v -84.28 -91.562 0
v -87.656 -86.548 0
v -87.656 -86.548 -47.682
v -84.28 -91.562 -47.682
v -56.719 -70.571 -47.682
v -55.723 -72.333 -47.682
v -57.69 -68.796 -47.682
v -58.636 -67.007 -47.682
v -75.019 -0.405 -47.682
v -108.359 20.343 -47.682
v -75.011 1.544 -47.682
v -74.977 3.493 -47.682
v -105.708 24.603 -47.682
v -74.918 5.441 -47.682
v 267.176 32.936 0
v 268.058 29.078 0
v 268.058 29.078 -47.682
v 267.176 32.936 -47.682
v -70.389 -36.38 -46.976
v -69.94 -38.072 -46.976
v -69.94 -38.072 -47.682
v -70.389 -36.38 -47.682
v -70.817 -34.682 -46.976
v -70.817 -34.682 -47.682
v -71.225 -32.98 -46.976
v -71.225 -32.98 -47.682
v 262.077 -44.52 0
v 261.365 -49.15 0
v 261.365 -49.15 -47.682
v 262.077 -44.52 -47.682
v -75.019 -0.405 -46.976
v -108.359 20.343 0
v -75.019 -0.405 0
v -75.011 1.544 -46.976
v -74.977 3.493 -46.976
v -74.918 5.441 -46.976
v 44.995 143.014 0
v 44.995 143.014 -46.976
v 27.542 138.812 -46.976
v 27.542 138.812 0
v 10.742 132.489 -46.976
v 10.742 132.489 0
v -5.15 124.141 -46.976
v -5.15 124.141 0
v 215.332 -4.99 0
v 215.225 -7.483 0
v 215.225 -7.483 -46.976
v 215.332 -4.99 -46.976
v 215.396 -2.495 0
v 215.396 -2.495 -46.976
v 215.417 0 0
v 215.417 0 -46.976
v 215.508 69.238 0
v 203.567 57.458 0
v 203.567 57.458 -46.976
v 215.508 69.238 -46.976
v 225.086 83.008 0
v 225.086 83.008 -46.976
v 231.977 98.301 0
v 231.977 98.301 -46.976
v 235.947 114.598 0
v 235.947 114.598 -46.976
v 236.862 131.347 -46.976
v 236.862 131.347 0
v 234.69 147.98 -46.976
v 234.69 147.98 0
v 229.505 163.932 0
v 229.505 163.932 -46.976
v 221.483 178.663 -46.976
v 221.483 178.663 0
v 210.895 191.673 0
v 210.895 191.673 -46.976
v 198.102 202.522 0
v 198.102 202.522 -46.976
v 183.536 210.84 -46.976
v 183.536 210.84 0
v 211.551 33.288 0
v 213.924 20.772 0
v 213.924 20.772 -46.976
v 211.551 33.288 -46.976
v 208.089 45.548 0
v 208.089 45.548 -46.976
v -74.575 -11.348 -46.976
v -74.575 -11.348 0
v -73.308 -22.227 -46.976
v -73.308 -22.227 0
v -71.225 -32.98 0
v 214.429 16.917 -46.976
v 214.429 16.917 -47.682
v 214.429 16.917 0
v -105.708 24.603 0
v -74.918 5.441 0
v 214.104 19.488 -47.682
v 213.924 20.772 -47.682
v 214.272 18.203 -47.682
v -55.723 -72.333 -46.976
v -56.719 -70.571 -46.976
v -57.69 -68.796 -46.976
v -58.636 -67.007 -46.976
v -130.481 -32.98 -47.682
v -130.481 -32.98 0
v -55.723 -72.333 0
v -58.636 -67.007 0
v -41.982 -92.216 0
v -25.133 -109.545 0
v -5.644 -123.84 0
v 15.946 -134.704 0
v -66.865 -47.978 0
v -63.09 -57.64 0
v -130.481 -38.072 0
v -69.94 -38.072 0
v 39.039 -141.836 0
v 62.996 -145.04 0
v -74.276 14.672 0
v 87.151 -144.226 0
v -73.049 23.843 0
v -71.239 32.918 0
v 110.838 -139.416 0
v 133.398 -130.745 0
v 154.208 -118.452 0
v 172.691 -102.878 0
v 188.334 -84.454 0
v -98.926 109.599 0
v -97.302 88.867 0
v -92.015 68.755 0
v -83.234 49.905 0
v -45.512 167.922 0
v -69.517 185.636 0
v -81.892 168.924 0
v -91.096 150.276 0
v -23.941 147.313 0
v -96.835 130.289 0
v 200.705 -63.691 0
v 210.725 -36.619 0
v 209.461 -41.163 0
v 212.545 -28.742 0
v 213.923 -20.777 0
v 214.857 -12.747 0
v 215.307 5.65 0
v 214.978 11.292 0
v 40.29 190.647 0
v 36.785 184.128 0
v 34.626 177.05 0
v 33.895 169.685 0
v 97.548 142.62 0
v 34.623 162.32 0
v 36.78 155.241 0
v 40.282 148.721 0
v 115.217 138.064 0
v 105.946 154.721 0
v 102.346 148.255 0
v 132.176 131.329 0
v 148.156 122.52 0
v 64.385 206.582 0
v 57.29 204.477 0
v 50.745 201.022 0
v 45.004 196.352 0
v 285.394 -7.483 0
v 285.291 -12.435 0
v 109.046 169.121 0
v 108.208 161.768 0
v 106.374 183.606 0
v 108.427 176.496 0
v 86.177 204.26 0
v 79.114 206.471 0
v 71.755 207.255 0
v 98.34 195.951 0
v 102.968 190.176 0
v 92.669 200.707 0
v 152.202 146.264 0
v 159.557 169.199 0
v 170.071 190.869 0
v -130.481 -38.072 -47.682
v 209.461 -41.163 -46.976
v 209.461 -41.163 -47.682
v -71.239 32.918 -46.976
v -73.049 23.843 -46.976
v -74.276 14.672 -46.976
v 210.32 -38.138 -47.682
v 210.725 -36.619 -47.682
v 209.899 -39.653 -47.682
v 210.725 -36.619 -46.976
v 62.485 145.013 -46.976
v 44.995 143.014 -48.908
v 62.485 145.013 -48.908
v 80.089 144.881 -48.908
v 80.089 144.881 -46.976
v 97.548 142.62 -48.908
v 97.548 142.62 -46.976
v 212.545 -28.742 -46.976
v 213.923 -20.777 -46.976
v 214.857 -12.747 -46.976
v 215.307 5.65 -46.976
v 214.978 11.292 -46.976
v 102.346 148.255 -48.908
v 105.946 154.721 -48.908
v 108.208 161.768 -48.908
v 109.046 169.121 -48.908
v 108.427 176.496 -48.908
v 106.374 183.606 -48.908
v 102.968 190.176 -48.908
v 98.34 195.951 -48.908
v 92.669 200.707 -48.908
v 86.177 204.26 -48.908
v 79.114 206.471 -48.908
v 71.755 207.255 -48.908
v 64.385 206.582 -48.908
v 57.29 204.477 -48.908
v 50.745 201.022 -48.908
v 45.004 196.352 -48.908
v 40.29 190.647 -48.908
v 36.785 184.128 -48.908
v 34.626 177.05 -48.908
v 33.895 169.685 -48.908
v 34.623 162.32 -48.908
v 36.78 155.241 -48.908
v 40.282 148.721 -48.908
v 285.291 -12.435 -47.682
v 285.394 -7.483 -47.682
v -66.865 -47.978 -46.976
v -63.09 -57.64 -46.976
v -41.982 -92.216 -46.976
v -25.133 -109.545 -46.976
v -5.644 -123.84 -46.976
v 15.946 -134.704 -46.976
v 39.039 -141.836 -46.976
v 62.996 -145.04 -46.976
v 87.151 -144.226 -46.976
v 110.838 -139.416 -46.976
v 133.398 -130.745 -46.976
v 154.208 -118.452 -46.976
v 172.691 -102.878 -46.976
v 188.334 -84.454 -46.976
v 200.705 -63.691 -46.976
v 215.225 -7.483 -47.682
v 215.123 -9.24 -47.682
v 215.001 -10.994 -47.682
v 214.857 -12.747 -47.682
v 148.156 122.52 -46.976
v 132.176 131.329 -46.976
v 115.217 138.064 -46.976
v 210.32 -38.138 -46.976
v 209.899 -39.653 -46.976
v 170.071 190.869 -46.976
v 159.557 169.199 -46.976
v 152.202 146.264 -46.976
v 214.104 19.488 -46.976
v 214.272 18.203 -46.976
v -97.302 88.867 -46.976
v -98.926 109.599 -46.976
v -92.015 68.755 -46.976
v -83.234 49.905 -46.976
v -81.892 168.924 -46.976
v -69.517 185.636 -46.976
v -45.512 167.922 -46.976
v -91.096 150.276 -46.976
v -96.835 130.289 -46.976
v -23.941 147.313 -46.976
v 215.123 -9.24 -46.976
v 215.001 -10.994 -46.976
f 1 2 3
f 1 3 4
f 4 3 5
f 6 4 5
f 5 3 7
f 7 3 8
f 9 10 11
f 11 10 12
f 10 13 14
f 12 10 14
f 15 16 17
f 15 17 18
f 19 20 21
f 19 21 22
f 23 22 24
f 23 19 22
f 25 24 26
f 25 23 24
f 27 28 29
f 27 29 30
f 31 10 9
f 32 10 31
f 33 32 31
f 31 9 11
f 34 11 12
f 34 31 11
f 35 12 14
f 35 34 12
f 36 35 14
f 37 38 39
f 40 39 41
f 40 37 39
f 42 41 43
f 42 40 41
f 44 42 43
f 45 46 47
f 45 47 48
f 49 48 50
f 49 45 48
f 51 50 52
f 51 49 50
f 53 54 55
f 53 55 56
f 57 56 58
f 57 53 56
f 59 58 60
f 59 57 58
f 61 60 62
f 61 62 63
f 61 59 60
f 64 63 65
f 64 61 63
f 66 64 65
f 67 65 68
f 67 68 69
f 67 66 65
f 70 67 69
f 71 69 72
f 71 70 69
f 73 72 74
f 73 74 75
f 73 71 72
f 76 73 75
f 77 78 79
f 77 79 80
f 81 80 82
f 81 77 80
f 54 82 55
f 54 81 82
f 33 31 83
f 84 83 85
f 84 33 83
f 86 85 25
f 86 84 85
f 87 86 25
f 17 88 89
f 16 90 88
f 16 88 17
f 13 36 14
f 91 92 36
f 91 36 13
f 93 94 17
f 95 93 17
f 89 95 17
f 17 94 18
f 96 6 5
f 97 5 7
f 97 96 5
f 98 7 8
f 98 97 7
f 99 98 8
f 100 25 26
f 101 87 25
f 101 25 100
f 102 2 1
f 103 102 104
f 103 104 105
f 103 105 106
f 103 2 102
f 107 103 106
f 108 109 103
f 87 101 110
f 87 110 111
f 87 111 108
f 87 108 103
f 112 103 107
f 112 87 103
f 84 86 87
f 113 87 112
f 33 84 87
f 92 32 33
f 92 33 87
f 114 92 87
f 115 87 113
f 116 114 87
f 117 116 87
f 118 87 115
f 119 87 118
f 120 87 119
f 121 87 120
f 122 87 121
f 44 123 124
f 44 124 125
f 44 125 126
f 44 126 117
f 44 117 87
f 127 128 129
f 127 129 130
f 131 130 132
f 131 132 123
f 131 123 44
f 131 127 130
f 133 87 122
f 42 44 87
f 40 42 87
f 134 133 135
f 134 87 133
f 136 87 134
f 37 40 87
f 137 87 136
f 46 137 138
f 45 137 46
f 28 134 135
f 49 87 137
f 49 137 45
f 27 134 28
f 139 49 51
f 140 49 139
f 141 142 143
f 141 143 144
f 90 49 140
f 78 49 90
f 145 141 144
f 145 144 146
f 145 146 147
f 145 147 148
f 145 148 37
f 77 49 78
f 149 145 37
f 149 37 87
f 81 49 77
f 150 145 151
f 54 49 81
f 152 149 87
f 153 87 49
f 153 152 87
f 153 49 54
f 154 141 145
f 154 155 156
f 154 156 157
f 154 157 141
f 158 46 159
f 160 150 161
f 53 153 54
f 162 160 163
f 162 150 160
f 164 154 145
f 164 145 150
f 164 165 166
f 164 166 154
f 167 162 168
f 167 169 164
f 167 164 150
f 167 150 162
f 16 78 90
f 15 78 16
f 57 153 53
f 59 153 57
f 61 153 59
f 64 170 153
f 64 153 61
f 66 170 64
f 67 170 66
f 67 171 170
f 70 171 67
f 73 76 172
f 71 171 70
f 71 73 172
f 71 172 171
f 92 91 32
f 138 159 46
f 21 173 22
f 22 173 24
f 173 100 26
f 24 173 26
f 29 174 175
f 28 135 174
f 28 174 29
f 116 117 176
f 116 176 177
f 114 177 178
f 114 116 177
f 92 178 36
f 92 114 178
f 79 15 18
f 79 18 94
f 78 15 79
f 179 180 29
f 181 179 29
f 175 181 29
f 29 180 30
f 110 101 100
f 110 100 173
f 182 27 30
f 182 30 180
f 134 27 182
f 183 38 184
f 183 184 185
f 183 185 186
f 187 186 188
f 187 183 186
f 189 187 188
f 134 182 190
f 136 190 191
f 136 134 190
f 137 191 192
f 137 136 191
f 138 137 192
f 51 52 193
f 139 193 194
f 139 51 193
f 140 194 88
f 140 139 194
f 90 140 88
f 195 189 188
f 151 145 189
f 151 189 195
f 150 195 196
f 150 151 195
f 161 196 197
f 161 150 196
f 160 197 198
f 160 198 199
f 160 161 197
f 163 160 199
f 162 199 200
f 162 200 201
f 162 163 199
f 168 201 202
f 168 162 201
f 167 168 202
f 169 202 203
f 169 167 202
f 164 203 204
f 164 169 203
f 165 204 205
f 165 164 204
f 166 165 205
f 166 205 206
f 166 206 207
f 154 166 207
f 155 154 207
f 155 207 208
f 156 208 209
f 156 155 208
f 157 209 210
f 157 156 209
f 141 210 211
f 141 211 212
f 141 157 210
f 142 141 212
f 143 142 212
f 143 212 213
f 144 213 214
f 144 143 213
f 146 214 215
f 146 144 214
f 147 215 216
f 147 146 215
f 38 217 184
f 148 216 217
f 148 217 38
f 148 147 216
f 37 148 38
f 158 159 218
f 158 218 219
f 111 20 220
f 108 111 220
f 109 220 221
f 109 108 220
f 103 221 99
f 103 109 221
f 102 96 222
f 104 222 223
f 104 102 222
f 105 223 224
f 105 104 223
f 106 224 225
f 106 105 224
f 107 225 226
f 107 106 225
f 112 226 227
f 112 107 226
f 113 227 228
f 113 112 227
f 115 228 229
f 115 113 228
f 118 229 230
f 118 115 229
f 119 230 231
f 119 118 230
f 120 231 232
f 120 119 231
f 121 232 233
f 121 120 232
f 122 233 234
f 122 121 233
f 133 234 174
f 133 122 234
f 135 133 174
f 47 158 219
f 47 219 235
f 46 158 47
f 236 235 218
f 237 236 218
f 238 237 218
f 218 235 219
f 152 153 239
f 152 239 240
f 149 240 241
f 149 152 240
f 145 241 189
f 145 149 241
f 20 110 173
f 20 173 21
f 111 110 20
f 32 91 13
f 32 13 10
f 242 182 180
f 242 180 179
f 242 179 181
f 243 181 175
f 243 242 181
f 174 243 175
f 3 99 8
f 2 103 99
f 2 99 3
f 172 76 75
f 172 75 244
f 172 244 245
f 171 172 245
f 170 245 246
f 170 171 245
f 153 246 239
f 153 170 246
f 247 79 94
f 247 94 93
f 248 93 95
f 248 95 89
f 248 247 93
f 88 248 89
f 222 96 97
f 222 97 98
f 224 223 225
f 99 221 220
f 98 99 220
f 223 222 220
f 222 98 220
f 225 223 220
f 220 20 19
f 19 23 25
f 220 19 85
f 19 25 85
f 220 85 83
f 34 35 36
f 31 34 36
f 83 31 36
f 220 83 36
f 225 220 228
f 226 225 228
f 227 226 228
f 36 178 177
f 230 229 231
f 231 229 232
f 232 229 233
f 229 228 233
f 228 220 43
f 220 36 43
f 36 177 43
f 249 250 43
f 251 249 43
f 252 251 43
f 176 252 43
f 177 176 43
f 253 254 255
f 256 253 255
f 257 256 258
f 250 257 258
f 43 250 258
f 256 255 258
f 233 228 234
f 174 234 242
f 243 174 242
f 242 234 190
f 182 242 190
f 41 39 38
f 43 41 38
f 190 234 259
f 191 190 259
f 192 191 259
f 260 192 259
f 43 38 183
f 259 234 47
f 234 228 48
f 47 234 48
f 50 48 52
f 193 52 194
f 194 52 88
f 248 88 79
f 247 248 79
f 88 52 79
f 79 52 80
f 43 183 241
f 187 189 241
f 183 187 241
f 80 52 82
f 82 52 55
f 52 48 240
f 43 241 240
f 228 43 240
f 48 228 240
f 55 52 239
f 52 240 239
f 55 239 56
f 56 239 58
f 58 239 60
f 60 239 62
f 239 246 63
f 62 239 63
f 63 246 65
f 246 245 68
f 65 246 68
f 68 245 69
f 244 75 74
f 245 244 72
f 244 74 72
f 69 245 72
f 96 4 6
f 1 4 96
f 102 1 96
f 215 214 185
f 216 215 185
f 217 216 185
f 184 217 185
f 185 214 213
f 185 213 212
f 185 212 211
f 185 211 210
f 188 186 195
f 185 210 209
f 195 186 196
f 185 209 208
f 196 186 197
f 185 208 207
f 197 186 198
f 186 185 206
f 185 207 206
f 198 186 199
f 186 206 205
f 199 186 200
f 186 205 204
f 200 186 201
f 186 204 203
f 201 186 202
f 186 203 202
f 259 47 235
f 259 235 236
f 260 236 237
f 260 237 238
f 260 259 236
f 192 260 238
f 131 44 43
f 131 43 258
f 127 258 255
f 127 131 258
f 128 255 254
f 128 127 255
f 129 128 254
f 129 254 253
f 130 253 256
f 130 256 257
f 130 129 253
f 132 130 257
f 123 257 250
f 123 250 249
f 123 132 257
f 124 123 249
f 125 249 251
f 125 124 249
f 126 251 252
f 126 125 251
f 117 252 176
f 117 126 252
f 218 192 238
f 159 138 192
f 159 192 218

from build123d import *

# Parameters (mm, degrees)
F1_DEPTH = 46.9760447741
F3_DEPTH = 48.9080855623
F6_DEPTH = 47.6816631854


with BuildPart() as f1:
    # F0 (on Top) → F1 (new body)
    with BuildSketch(Plane.XY):
        with BuildLine():
            ThreePointArc((-71.2393962349, 32.9179256613), (53.631854808, -144.2703545516), (215.4174560814, 0))
            ThreePointArc((215.4174560814, 0), (212.4239330052, 29.333743716), (203.5667803118, 57.4581200997))
            ThreePointArc((203.5667803118, 57.4581200997), (180.7556781079, 94.1574324953), (148.1557889137, 122.5199630346))
            ThreePointArc((148.1557889137, 122.5199630346), (71.7340942101, 145.2103590343), (-5.1502163644, 124.140658527))
            ThreePointArc((-5.1502163644, 124.140658527), (-47.4003805504, 85.1985600864), (-71.2393962349, 32.9179256613))
        make_face()
        with BuildLine():
            ThreePointArc((148.1557889137, 122.5199630346), (180.7556781079, 94.1574324953), (203.5667803118, 57.4581200997))
            ThreePointArc((203.5667803118, 57.4581200997), (236.1595707678, 139.7134864477), (183.5359483957, 210.840061307))
            ThreePointArc((183.5359483957, 210.840061307), (159.5565215905, 169.199462517), (148.1557889137, 122.5199630346))
        make_face()
        with BuildLine():
            ThreePointArc((-69.5170983672, 185.6363117695), (-98.925732723, 109.5990660233), (-71.2393962349, 32.9179256613))
            ThreePointArc((-71.2393962349, 32.9179256613), (-47.4003805504, 85.1985600864), (-5.1502163644, 124.140658527))
            ThreePointArc((-5.1502163644, 124.140658527), (-34.3996197413, 157.9595128325), (-69.5170983672, 185.6363117695))
        make_face()
    extrude(amount=-F1_DEPTH)

    # F2 (on face) → F3 (join)
    with BuildSketch(Plane.XY):
        with BuildLine():
            ThreePointArc((44.9946392241, 143.0144957499), (71.2893502257, 145.2143795795), (97.5480618405, 142.6198892915))
            ThreePointArc((97.5480618405, 142.6198892915), (71.7551928662, 207.2549889957), (44.9946392241, 143.0144957499))
        make_face()
    extrude(amount=-F3_DEPTH)

    # F5 (on face) → F6 (join)
    with BuildSketch(Plane.XY):
        with BuildLine():
            ThreePointArc((-75.0189256599, -0.404913858), (-74.9976500667, 2.5184711417), (-74.917529707, 5.4408354645))
            Line((-74.917529707, 5.4408354645), (-105.7080030441, 24.6027484536))
            Line((-105.7080030441, 24.6027484536), (-108.3586743244, 20.3434960801))
            Line((-108.3586743244, 20.3434960801), (-75.0189256599, -0.404913858))
        make_face()
        with BuildLine():
            ThreePointArc((-69.9400027769, -38.0719006061), (-70.6055307061, -35.5315897531), (-71.2250142357, -32.9796597362))
            Line((-71.2250142357, -32.9796597362), (-130.4813623428, -32.9796597362))
            Line((-130.4813623428, -32.9796597362), (-130.4813623428, -38.0719006062))
            Line((-130.4813623428, -38.0719006062), (-69.9400027769, -38.0719006062))
        make_face()
        with BuildLine():
            ThreePointArc((-55.7230830607, -72.3328295314), (-57.207340031, -69.6852480865), (-58.6359381198, -67.0072238594))
            Line((-58.6359381198, -67.0072238594), (-87.6557826996, -86.5481868386))
            Line((-87.6557826996, -86.5481868386), (-84.2797279511, -91.561889807))
            Line((-84.2797279511, -91.561889807), (-55.7230830607, -72.3328295314))
        make_face()
        with BuildLine():
            ThreePointArc((215.2245101702, -7.483407855), (215.0646070932, -10.1171082931), (214.8568793088, -12.747468755))
            Line((214.8568793088, -12.747468755), (285.2909564972, -12.4354660511))
            Line((285.2909564972, -12.4354660511), (285.3941321373, -7.483407855))
            Line((285.3941321373, -7.483407855), (215.2245101702, -7.483407855))
        make_face()
        with BuildLine():
            ThreePointArc((210.7247036656, -36.618666769), (210.1115019764, -38.8959118449), (209.4613997229, -41.1628985028))
            Line((209.4613997229, -41.1628985028), (261.3650764015, -49.1495164643))
            Line((261.3650764015, -49.1495164643), (262.0773613453, -44.5204973221))
            Line((262.0773613453, -44.5204973221), (210.7247036656, -36.618666769))
        make_face()
        with BuildLine():
            Line((267.1763300896, 32.936360687), (213.9242377293, 20.7715208216))
            ThreePointArc((213.9242377293, 20.7715208216), (214.1894129137, 18.8457161569), (214.4287850178, 16.9165343406))
            Line((214.4287850178, 16.9165343406), (268.0576479304, 29.0783551911))
            Line((268.0576479304, 29.0783551911), (267.1763300896, 32.936360687))
        make_face()
    extrude(amount=-F6_DEPTH)


solid = f1.part
